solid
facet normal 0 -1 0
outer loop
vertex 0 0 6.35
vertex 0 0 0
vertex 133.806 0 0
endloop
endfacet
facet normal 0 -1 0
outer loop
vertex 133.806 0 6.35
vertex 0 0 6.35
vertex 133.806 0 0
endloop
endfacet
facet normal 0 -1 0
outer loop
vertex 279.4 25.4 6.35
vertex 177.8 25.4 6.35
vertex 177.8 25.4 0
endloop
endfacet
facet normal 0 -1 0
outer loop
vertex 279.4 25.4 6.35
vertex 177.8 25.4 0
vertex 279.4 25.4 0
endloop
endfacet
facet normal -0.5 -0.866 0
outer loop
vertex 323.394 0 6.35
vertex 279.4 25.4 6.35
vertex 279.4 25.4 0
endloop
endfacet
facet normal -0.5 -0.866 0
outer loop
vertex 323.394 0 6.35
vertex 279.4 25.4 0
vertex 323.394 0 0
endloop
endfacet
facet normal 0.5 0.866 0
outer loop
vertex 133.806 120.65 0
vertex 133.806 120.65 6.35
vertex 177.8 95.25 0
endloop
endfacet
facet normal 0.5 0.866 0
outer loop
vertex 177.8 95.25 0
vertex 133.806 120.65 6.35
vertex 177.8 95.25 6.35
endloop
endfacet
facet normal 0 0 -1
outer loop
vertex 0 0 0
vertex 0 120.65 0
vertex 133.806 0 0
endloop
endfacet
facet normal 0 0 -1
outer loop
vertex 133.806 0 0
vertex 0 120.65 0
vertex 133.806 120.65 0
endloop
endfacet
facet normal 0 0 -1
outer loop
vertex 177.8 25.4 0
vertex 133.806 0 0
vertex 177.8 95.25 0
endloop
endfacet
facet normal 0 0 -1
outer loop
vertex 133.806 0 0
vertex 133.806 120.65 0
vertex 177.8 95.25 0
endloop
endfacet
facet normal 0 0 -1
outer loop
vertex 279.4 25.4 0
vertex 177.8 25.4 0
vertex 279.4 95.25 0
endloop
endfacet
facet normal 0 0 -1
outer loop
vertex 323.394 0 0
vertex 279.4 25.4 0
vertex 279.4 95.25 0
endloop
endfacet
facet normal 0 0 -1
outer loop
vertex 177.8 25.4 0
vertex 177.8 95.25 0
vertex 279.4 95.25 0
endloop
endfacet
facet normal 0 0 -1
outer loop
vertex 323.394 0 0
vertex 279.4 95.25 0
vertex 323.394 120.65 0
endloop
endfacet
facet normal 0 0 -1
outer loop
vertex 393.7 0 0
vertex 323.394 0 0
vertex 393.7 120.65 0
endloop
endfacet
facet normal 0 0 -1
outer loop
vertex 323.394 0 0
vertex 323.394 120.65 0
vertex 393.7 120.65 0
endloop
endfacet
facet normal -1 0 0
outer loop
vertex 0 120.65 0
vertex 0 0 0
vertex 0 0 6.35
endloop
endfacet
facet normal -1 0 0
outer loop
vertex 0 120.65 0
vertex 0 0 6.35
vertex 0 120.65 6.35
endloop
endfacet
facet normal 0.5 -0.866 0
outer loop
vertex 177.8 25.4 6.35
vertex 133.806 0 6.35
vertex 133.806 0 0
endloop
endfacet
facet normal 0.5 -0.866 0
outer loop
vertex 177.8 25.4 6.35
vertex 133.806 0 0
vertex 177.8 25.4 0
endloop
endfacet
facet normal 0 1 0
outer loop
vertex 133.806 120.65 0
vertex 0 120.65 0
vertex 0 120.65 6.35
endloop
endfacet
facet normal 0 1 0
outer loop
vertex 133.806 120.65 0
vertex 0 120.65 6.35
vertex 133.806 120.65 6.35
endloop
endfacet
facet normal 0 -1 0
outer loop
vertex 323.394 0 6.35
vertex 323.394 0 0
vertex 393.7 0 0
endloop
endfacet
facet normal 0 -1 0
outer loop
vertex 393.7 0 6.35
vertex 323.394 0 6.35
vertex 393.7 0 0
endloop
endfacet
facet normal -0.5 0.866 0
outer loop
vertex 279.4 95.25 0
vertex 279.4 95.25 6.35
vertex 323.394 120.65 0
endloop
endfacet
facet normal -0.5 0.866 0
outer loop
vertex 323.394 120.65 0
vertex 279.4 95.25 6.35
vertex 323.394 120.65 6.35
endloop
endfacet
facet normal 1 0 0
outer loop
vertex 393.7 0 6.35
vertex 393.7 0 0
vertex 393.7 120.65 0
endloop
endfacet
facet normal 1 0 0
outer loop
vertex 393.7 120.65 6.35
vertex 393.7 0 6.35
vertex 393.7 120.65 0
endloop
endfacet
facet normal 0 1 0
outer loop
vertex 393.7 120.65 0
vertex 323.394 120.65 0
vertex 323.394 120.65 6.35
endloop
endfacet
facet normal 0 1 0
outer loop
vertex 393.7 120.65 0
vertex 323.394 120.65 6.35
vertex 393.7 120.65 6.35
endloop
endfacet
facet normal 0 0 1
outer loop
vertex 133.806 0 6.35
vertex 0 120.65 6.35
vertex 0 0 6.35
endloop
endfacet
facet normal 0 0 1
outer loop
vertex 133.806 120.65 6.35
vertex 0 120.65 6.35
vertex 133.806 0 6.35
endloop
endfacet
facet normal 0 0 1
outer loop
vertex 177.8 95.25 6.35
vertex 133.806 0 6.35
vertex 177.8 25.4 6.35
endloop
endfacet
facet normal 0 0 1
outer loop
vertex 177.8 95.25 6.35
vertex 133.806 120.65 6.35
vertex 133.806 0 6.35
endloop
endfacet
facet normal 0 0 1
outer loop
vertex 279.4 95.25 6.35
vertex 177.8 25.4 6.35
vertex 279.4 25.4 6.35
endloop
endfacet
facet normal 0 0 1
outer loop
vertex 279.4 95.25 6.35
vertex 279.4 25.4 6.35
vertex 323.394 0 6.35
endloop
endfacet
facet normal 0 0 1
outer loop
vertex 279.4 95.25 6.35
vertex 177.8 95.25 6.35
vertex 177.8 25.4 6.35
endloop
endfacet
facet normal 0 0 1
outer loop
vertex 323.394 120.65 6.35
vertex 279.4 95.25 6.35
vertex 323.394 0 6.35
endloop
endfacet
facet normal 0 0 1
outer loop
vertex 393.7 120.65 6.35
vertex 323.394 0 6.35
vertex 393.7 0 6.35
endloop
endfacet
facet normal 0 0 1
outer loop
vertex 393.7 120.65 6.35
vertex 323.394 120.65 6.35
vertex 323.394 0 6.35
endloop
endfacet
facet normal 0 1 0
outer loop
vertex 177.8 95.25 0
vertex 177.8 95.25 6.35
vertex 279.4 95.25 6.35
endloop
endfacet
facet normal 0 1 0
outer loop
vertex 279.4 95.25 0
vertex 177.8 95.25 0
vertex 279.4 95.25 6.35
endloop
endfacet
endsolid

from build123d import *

# Parameters (mm, degrees)
SKETCH1_W           = 393.7
SKETCH1_H           = 120.65
BOSS_EXTRUDE1_DEPTH = 6.35
CUT_EXTRUDE1_DEPTH  = 7.35


with BuildPart() as part:
    # Sketch1 → Boss-Extrude1 (new body)
    with BuildSketch(Plane.XY):
        with Locations((196.85, 60.325)):
            Rectangle(SKETCH1_W, SKETCH1_H)
    extrude(amount=BOSS_EXTRUDE1_DEPTH)

    # Sketch2 → Cut-Extrude1 (cut, through all)
    with BuildSketch(Plane.XY.offset(6.35)):
        Polygon((133.805909488, 120.65), (177.8, 95.25), (279.4, 95.25), (323.394090512, 120.65), align=None)
        Polygon((133.805909488, 0), (177.8, 25.4), (279.4, 25.4), (323.394090512, 0), align=None)
    extrude(amount=-CUT_EXTRUDE1_DEPTH, mode=Mode.SUBTRACT)


solid = part.part
